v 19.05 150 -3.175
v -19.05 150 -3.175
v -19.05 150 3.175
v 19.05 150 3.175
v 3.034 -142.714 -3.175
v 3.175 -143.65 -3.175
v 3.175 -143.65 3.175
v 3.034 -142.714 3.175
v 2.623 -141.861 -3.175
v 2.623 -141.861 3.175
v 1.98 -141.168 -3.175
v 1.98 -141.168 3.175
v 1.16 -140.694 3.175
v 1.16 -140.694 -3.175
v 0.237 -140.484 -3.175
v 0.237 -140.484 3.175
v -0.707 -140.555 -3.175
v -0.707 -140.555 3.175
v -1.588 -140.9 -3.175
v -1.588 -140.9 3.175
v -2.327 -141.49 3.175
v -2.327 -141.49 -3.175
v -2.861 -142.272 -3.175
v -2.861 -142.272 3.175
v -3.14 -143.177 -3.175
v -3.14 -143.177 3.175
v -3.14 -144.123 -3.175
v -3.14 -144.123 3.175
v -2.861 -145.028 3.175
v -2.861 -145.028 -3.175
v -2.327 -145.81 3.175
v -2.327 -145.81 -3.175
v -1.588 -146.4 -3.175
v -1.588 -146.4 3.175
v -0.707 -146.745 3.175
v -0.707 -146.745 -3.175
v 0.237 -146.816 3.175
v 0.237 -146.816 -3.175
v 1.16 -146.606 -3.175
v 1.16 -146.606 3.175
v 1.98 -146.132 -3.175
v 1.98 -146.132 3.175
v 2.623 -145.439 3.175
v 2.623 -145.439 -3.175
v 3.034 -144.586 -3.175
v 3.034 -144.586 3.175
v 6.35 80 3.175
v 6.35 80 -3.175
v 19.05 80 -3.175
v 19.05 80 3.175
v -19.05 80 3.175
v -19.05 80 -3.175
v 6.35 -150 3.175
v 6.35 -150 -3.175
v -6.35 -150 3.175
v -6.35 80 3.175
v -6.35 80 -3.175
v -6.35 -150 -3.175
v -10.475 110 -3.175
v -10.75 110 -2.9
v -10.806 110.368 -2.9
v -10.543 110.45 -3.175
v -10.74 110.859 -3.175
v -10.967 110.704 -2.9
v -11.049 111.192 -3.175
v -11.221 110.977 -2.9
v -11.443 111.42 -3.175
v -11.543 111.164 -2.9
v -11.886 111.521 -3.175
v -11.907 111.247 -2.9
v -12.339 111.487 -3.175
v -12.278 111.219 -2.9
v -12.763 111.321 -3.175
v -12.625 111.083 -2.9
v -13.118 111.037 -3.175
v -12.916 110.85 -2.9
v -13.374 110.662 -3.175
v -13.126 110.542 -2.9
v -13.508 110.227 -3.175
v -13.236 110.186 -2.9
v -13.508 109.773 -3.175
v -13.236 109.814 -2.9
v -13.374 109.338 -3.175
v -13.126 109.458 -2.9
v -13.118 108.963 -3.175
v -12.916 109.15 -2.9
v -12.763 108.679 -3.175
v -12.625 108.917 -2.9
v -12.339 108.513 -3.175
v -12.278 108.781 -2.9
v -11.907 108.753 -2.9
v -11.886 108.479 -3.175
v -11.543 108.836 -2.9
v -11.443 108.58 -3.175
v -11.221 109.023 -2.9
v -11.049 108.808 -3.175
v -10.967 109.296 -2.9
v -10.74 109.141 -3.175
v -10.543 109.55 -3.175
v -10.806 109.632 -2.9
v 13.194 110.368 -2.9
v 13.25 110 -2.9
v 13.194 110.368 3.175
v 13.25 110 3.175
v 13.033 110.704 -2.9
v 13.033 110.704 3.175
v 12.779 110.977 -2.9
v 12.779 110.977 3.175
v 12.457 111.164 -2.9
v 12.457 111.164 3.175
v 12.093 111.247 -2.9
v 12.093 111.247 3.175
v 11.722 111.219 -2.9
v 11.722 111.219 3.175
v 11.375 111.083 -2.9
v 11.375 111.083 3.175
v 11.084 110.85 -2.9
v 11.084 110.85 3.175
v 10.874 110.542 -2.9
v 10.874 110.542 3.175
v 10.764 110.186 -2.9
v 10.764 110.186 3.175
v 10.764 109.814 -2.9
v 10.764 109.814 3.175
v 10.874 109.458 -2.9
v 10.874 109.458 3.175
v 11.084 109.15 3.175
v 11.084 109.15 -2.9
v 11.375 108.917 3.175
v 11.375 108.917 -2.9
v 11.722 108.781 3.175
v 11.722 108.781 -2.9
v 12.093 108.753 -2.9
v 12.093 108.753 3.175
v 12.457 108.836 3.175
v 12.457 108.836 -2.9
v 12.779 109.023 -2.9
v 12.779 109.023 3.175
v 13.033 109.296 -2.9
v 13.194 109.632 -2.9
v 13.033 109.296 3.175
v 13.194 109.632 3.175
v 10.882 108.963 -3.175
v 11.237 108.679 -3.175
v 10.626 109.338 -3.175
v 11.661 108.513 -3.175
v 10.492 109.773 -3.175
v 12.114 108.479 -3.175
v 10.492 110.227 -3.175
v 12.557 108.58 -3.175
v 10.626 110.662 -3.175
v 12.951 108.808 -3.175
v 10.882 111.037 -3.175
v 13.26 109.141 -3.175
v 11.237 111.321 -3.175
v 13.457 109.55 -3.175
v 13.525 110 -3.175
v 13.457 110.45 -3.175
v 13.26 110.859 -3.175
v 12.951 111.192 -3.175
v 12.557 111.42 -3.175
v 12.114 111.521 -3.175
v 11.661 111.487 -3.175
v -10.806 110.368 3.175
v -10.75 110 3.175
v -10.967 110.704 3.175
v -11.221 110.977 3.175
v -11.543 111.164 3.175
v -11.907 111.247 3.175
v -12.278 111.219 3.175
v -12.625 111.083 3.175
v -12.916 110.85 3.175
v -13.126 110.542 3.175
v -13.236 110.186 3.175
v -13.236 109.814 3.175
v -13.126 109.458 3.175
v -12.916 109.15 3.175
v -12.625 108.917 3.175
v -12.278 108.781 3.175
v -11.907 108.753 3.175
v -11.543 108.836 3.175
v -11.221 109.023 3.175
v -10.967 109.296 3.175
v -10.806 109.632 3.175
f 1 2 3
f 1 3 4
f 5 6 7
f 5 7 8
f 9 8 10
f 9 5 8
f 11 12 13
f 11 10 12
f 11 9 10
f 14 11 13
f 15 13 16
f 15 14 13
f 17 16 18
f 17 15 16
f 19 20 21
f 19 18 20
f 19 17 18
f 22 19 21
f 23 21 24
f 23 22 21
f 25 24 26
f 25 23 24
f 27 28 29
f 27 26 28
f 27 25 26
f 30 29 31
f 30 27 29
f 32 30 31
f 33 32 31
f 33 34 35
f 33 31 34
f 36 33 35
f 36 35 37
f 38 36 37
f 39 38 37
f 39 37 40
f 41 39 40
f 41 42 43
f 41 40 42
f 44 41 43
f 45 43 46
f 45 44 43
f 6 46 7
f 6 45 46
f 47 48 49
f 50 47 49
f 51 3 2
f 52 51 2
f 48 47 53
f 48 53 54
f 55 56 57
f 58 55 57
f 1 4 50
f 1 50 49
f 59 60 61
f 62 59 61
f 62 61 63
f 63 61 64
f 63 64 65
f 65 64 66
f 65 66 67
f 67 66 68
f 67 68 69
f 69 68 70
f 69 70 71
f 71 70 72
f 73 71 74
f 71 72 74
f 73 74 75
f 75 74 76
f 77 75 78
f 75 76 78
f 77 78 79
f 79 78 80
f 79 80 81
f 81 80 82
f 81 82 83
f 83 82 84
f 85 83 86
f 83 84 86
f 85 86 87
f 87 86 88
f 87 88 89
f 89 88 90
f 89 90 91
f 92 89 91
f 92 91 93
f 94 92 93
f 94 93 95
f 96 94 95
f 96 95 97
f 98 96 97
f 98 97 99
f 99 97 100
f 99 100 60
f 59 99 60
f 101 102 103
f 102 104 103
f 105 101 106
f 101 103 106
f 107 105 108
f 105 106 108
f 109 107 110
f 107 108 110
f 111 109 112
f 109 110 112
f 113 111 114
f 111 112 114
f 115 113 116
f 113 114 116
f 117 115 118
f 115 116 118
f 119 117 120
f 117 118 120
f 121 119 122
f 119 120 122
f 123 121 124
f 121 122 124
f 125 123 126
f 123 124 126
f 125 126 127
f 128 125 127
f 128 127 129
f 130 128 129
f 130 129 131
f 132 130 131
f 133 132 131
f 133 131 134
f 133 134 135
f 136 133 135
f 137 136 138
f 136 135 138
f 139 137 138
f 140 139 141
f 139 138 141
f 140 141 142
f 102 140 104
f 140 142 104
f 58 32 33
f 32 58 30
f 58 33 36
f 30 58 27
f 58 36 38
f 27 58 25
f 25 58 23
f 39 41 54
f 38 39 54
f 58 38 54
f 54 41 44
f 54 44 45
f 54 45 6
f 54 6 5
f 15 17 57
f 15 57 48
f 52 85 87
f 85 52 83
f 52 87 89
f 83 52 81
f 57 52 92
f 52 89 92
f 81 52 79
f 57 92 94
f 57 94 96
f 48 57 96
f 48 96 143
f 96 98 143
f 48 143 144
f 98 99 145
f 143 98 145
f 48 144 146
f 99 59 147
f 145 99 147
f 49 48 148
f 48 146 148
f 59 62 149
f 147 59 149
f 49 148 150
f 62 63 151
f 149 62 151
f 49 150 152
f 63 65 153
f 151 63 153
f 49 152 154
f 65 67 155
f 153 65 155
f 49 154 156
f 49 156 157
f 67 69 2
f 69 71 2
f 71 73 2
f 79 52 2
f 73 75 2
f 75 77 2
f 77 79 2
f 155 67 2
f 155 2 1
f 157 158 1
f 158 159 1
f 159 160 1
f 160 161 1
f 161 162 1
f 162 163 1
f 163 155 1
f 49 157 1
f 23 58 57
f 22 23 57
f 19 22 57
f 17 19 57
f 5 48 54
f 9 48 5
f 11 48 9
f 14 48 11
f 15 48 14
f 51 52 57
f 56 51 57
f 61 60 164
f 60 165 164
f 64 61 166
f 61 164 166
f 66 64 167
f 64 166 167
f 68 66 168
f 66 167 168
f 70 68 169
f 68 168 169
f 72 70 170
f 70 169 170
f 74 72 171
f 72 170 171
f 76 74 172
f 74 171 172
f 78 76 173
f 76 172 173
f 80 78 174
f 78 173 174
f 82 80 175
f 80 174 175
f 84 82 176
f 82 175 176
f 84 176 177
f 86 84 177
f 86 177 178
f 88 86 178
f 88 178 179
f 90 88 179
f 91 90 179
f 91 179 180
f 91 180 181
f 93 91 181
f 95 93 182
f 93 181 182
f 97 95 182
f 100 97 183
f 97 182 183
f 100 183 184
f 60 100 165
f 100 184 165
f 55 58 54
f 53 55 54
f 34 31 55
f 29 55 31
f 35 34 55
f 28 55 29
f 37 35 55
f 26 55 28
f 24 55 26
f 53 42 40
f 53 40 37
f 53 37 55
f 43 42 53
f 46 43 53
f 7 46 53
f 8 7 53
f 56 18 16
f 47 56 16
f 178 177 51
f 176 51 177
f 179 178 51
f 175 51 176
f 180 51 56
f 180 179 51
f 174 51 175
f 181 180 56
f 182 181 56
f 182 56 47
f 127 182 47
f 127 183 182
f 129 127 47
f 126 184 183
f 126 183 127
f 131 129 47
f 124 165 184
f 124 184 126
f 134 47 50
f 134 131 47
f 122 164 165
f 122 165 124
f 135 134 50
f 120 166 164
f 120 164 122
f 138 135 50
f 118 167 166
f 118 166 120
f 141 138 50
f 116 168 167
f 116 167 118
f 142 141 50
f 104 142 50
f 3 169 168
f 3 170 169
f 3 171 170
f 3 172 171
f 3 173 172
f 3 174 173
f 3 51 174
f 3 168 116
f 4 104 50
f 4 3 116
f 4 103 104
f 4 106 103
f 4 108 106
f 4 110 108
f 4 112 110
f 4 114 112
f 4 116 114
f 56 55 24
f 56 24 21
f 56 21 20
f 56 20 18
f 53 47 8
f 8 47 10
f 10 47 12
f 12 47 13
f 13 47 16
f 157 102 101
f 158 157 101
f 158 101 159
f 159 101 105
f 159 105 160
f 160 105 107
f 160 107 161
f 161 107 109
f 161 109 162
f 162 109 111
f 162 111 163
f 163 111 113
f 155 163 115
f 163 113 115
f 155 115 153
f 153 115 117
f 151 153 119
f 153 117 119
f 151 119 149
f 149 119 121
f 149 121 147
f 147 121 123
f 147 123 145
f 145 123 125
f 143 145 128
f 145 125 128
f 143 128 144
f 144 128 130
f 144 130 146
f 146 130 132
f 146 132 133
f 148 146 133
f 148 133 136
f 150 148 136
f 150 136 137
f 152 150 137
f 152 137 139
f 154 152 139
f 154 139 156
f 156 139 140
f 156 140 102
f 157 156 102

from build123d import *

# Parameters (mm, degrees)
CROQUIS1_W                      = 12.7
CROQUIS1_H                      = 6.35
SALIENTE_EXTRUIR1_DEPTH         = 150
CORTAR_EXTRUIR1_DEPTH           = 151.16791643
CORTAR_EXTRUIR1_DEPTH_BACK      = 151.16791643
CROQUIS2_R                      = 3.175
CROQUIS3_W                      = 38.1
CROQUIS3_H                      = 6.35
SALIENTE_EXTRUIR2_DEPTH         = 70
TALADRO_ROSCADO_M31_D           = 2.5
TALADRO_ROSCADO_M31_CSINK_D     = 3.05
TALADRO_ROSCADO_M31_CSINK_ANGLE = 90


with BuildPart() as part:
    # Croquis1 → Saliente-Extruir1 (new, symmetric)
    with BuildSketch(Plane(origin=(0, 0, 0), x_dir=(1, 0, 0), z_dir=(0, 1, 0))):
        Rectangle(CROQUIS1_W, CROQUIS1_H)
    extrude(amount=SALIENTE_EXTRUIR1_DEPTH, both=True)

    # Croquis2 → Cortar-Extruir1 (cut, two sides: drawn at the far end of the back side and taken through both)
    with BuildSketch(Plane.XY.offset(-CORTAR_EXTRUIR1_DEPTH_BACK)):
        with Locations((0, -143.65)):
            Circle(CROQUIS2_R)
    extrude(amount=CORTAR_EXTRUIR1_DEPTH + CORTAR_EXTRUIR1_DEPTH_BACK, mode=Mode.SUBTRACT)

    # Croquis3 → Saliente-Extruir2 (add)
    with BuildSketch(Plane(origin=(0, 150, 0), x_dir=(1, 0, 0), z_dir=(0, 1, 0))):
        Rectangle(CROQUIS3_W, CROQUIS3_H)
    extrude(amount=-SALIENTE_EXTRUIR2_DEPTH)

    # Taladro roscado M31 (through all)
    with Locations(Plane(origin=(0, 0, -3.175), x_dir=(-1, 0, 0), z_dir=(0, 0, -1))):
        with Locations((12, 110), (-12, 110)):
            CounterSinkHole(TALADRO_ROSCADO_M31_D / 2, TALADRO_ROSCADO_M31_CSINK_D / 2, counter_sink_angle=TALADRO_ROSCADO_M31_CSINK_ANGLE)


solid = part.part
